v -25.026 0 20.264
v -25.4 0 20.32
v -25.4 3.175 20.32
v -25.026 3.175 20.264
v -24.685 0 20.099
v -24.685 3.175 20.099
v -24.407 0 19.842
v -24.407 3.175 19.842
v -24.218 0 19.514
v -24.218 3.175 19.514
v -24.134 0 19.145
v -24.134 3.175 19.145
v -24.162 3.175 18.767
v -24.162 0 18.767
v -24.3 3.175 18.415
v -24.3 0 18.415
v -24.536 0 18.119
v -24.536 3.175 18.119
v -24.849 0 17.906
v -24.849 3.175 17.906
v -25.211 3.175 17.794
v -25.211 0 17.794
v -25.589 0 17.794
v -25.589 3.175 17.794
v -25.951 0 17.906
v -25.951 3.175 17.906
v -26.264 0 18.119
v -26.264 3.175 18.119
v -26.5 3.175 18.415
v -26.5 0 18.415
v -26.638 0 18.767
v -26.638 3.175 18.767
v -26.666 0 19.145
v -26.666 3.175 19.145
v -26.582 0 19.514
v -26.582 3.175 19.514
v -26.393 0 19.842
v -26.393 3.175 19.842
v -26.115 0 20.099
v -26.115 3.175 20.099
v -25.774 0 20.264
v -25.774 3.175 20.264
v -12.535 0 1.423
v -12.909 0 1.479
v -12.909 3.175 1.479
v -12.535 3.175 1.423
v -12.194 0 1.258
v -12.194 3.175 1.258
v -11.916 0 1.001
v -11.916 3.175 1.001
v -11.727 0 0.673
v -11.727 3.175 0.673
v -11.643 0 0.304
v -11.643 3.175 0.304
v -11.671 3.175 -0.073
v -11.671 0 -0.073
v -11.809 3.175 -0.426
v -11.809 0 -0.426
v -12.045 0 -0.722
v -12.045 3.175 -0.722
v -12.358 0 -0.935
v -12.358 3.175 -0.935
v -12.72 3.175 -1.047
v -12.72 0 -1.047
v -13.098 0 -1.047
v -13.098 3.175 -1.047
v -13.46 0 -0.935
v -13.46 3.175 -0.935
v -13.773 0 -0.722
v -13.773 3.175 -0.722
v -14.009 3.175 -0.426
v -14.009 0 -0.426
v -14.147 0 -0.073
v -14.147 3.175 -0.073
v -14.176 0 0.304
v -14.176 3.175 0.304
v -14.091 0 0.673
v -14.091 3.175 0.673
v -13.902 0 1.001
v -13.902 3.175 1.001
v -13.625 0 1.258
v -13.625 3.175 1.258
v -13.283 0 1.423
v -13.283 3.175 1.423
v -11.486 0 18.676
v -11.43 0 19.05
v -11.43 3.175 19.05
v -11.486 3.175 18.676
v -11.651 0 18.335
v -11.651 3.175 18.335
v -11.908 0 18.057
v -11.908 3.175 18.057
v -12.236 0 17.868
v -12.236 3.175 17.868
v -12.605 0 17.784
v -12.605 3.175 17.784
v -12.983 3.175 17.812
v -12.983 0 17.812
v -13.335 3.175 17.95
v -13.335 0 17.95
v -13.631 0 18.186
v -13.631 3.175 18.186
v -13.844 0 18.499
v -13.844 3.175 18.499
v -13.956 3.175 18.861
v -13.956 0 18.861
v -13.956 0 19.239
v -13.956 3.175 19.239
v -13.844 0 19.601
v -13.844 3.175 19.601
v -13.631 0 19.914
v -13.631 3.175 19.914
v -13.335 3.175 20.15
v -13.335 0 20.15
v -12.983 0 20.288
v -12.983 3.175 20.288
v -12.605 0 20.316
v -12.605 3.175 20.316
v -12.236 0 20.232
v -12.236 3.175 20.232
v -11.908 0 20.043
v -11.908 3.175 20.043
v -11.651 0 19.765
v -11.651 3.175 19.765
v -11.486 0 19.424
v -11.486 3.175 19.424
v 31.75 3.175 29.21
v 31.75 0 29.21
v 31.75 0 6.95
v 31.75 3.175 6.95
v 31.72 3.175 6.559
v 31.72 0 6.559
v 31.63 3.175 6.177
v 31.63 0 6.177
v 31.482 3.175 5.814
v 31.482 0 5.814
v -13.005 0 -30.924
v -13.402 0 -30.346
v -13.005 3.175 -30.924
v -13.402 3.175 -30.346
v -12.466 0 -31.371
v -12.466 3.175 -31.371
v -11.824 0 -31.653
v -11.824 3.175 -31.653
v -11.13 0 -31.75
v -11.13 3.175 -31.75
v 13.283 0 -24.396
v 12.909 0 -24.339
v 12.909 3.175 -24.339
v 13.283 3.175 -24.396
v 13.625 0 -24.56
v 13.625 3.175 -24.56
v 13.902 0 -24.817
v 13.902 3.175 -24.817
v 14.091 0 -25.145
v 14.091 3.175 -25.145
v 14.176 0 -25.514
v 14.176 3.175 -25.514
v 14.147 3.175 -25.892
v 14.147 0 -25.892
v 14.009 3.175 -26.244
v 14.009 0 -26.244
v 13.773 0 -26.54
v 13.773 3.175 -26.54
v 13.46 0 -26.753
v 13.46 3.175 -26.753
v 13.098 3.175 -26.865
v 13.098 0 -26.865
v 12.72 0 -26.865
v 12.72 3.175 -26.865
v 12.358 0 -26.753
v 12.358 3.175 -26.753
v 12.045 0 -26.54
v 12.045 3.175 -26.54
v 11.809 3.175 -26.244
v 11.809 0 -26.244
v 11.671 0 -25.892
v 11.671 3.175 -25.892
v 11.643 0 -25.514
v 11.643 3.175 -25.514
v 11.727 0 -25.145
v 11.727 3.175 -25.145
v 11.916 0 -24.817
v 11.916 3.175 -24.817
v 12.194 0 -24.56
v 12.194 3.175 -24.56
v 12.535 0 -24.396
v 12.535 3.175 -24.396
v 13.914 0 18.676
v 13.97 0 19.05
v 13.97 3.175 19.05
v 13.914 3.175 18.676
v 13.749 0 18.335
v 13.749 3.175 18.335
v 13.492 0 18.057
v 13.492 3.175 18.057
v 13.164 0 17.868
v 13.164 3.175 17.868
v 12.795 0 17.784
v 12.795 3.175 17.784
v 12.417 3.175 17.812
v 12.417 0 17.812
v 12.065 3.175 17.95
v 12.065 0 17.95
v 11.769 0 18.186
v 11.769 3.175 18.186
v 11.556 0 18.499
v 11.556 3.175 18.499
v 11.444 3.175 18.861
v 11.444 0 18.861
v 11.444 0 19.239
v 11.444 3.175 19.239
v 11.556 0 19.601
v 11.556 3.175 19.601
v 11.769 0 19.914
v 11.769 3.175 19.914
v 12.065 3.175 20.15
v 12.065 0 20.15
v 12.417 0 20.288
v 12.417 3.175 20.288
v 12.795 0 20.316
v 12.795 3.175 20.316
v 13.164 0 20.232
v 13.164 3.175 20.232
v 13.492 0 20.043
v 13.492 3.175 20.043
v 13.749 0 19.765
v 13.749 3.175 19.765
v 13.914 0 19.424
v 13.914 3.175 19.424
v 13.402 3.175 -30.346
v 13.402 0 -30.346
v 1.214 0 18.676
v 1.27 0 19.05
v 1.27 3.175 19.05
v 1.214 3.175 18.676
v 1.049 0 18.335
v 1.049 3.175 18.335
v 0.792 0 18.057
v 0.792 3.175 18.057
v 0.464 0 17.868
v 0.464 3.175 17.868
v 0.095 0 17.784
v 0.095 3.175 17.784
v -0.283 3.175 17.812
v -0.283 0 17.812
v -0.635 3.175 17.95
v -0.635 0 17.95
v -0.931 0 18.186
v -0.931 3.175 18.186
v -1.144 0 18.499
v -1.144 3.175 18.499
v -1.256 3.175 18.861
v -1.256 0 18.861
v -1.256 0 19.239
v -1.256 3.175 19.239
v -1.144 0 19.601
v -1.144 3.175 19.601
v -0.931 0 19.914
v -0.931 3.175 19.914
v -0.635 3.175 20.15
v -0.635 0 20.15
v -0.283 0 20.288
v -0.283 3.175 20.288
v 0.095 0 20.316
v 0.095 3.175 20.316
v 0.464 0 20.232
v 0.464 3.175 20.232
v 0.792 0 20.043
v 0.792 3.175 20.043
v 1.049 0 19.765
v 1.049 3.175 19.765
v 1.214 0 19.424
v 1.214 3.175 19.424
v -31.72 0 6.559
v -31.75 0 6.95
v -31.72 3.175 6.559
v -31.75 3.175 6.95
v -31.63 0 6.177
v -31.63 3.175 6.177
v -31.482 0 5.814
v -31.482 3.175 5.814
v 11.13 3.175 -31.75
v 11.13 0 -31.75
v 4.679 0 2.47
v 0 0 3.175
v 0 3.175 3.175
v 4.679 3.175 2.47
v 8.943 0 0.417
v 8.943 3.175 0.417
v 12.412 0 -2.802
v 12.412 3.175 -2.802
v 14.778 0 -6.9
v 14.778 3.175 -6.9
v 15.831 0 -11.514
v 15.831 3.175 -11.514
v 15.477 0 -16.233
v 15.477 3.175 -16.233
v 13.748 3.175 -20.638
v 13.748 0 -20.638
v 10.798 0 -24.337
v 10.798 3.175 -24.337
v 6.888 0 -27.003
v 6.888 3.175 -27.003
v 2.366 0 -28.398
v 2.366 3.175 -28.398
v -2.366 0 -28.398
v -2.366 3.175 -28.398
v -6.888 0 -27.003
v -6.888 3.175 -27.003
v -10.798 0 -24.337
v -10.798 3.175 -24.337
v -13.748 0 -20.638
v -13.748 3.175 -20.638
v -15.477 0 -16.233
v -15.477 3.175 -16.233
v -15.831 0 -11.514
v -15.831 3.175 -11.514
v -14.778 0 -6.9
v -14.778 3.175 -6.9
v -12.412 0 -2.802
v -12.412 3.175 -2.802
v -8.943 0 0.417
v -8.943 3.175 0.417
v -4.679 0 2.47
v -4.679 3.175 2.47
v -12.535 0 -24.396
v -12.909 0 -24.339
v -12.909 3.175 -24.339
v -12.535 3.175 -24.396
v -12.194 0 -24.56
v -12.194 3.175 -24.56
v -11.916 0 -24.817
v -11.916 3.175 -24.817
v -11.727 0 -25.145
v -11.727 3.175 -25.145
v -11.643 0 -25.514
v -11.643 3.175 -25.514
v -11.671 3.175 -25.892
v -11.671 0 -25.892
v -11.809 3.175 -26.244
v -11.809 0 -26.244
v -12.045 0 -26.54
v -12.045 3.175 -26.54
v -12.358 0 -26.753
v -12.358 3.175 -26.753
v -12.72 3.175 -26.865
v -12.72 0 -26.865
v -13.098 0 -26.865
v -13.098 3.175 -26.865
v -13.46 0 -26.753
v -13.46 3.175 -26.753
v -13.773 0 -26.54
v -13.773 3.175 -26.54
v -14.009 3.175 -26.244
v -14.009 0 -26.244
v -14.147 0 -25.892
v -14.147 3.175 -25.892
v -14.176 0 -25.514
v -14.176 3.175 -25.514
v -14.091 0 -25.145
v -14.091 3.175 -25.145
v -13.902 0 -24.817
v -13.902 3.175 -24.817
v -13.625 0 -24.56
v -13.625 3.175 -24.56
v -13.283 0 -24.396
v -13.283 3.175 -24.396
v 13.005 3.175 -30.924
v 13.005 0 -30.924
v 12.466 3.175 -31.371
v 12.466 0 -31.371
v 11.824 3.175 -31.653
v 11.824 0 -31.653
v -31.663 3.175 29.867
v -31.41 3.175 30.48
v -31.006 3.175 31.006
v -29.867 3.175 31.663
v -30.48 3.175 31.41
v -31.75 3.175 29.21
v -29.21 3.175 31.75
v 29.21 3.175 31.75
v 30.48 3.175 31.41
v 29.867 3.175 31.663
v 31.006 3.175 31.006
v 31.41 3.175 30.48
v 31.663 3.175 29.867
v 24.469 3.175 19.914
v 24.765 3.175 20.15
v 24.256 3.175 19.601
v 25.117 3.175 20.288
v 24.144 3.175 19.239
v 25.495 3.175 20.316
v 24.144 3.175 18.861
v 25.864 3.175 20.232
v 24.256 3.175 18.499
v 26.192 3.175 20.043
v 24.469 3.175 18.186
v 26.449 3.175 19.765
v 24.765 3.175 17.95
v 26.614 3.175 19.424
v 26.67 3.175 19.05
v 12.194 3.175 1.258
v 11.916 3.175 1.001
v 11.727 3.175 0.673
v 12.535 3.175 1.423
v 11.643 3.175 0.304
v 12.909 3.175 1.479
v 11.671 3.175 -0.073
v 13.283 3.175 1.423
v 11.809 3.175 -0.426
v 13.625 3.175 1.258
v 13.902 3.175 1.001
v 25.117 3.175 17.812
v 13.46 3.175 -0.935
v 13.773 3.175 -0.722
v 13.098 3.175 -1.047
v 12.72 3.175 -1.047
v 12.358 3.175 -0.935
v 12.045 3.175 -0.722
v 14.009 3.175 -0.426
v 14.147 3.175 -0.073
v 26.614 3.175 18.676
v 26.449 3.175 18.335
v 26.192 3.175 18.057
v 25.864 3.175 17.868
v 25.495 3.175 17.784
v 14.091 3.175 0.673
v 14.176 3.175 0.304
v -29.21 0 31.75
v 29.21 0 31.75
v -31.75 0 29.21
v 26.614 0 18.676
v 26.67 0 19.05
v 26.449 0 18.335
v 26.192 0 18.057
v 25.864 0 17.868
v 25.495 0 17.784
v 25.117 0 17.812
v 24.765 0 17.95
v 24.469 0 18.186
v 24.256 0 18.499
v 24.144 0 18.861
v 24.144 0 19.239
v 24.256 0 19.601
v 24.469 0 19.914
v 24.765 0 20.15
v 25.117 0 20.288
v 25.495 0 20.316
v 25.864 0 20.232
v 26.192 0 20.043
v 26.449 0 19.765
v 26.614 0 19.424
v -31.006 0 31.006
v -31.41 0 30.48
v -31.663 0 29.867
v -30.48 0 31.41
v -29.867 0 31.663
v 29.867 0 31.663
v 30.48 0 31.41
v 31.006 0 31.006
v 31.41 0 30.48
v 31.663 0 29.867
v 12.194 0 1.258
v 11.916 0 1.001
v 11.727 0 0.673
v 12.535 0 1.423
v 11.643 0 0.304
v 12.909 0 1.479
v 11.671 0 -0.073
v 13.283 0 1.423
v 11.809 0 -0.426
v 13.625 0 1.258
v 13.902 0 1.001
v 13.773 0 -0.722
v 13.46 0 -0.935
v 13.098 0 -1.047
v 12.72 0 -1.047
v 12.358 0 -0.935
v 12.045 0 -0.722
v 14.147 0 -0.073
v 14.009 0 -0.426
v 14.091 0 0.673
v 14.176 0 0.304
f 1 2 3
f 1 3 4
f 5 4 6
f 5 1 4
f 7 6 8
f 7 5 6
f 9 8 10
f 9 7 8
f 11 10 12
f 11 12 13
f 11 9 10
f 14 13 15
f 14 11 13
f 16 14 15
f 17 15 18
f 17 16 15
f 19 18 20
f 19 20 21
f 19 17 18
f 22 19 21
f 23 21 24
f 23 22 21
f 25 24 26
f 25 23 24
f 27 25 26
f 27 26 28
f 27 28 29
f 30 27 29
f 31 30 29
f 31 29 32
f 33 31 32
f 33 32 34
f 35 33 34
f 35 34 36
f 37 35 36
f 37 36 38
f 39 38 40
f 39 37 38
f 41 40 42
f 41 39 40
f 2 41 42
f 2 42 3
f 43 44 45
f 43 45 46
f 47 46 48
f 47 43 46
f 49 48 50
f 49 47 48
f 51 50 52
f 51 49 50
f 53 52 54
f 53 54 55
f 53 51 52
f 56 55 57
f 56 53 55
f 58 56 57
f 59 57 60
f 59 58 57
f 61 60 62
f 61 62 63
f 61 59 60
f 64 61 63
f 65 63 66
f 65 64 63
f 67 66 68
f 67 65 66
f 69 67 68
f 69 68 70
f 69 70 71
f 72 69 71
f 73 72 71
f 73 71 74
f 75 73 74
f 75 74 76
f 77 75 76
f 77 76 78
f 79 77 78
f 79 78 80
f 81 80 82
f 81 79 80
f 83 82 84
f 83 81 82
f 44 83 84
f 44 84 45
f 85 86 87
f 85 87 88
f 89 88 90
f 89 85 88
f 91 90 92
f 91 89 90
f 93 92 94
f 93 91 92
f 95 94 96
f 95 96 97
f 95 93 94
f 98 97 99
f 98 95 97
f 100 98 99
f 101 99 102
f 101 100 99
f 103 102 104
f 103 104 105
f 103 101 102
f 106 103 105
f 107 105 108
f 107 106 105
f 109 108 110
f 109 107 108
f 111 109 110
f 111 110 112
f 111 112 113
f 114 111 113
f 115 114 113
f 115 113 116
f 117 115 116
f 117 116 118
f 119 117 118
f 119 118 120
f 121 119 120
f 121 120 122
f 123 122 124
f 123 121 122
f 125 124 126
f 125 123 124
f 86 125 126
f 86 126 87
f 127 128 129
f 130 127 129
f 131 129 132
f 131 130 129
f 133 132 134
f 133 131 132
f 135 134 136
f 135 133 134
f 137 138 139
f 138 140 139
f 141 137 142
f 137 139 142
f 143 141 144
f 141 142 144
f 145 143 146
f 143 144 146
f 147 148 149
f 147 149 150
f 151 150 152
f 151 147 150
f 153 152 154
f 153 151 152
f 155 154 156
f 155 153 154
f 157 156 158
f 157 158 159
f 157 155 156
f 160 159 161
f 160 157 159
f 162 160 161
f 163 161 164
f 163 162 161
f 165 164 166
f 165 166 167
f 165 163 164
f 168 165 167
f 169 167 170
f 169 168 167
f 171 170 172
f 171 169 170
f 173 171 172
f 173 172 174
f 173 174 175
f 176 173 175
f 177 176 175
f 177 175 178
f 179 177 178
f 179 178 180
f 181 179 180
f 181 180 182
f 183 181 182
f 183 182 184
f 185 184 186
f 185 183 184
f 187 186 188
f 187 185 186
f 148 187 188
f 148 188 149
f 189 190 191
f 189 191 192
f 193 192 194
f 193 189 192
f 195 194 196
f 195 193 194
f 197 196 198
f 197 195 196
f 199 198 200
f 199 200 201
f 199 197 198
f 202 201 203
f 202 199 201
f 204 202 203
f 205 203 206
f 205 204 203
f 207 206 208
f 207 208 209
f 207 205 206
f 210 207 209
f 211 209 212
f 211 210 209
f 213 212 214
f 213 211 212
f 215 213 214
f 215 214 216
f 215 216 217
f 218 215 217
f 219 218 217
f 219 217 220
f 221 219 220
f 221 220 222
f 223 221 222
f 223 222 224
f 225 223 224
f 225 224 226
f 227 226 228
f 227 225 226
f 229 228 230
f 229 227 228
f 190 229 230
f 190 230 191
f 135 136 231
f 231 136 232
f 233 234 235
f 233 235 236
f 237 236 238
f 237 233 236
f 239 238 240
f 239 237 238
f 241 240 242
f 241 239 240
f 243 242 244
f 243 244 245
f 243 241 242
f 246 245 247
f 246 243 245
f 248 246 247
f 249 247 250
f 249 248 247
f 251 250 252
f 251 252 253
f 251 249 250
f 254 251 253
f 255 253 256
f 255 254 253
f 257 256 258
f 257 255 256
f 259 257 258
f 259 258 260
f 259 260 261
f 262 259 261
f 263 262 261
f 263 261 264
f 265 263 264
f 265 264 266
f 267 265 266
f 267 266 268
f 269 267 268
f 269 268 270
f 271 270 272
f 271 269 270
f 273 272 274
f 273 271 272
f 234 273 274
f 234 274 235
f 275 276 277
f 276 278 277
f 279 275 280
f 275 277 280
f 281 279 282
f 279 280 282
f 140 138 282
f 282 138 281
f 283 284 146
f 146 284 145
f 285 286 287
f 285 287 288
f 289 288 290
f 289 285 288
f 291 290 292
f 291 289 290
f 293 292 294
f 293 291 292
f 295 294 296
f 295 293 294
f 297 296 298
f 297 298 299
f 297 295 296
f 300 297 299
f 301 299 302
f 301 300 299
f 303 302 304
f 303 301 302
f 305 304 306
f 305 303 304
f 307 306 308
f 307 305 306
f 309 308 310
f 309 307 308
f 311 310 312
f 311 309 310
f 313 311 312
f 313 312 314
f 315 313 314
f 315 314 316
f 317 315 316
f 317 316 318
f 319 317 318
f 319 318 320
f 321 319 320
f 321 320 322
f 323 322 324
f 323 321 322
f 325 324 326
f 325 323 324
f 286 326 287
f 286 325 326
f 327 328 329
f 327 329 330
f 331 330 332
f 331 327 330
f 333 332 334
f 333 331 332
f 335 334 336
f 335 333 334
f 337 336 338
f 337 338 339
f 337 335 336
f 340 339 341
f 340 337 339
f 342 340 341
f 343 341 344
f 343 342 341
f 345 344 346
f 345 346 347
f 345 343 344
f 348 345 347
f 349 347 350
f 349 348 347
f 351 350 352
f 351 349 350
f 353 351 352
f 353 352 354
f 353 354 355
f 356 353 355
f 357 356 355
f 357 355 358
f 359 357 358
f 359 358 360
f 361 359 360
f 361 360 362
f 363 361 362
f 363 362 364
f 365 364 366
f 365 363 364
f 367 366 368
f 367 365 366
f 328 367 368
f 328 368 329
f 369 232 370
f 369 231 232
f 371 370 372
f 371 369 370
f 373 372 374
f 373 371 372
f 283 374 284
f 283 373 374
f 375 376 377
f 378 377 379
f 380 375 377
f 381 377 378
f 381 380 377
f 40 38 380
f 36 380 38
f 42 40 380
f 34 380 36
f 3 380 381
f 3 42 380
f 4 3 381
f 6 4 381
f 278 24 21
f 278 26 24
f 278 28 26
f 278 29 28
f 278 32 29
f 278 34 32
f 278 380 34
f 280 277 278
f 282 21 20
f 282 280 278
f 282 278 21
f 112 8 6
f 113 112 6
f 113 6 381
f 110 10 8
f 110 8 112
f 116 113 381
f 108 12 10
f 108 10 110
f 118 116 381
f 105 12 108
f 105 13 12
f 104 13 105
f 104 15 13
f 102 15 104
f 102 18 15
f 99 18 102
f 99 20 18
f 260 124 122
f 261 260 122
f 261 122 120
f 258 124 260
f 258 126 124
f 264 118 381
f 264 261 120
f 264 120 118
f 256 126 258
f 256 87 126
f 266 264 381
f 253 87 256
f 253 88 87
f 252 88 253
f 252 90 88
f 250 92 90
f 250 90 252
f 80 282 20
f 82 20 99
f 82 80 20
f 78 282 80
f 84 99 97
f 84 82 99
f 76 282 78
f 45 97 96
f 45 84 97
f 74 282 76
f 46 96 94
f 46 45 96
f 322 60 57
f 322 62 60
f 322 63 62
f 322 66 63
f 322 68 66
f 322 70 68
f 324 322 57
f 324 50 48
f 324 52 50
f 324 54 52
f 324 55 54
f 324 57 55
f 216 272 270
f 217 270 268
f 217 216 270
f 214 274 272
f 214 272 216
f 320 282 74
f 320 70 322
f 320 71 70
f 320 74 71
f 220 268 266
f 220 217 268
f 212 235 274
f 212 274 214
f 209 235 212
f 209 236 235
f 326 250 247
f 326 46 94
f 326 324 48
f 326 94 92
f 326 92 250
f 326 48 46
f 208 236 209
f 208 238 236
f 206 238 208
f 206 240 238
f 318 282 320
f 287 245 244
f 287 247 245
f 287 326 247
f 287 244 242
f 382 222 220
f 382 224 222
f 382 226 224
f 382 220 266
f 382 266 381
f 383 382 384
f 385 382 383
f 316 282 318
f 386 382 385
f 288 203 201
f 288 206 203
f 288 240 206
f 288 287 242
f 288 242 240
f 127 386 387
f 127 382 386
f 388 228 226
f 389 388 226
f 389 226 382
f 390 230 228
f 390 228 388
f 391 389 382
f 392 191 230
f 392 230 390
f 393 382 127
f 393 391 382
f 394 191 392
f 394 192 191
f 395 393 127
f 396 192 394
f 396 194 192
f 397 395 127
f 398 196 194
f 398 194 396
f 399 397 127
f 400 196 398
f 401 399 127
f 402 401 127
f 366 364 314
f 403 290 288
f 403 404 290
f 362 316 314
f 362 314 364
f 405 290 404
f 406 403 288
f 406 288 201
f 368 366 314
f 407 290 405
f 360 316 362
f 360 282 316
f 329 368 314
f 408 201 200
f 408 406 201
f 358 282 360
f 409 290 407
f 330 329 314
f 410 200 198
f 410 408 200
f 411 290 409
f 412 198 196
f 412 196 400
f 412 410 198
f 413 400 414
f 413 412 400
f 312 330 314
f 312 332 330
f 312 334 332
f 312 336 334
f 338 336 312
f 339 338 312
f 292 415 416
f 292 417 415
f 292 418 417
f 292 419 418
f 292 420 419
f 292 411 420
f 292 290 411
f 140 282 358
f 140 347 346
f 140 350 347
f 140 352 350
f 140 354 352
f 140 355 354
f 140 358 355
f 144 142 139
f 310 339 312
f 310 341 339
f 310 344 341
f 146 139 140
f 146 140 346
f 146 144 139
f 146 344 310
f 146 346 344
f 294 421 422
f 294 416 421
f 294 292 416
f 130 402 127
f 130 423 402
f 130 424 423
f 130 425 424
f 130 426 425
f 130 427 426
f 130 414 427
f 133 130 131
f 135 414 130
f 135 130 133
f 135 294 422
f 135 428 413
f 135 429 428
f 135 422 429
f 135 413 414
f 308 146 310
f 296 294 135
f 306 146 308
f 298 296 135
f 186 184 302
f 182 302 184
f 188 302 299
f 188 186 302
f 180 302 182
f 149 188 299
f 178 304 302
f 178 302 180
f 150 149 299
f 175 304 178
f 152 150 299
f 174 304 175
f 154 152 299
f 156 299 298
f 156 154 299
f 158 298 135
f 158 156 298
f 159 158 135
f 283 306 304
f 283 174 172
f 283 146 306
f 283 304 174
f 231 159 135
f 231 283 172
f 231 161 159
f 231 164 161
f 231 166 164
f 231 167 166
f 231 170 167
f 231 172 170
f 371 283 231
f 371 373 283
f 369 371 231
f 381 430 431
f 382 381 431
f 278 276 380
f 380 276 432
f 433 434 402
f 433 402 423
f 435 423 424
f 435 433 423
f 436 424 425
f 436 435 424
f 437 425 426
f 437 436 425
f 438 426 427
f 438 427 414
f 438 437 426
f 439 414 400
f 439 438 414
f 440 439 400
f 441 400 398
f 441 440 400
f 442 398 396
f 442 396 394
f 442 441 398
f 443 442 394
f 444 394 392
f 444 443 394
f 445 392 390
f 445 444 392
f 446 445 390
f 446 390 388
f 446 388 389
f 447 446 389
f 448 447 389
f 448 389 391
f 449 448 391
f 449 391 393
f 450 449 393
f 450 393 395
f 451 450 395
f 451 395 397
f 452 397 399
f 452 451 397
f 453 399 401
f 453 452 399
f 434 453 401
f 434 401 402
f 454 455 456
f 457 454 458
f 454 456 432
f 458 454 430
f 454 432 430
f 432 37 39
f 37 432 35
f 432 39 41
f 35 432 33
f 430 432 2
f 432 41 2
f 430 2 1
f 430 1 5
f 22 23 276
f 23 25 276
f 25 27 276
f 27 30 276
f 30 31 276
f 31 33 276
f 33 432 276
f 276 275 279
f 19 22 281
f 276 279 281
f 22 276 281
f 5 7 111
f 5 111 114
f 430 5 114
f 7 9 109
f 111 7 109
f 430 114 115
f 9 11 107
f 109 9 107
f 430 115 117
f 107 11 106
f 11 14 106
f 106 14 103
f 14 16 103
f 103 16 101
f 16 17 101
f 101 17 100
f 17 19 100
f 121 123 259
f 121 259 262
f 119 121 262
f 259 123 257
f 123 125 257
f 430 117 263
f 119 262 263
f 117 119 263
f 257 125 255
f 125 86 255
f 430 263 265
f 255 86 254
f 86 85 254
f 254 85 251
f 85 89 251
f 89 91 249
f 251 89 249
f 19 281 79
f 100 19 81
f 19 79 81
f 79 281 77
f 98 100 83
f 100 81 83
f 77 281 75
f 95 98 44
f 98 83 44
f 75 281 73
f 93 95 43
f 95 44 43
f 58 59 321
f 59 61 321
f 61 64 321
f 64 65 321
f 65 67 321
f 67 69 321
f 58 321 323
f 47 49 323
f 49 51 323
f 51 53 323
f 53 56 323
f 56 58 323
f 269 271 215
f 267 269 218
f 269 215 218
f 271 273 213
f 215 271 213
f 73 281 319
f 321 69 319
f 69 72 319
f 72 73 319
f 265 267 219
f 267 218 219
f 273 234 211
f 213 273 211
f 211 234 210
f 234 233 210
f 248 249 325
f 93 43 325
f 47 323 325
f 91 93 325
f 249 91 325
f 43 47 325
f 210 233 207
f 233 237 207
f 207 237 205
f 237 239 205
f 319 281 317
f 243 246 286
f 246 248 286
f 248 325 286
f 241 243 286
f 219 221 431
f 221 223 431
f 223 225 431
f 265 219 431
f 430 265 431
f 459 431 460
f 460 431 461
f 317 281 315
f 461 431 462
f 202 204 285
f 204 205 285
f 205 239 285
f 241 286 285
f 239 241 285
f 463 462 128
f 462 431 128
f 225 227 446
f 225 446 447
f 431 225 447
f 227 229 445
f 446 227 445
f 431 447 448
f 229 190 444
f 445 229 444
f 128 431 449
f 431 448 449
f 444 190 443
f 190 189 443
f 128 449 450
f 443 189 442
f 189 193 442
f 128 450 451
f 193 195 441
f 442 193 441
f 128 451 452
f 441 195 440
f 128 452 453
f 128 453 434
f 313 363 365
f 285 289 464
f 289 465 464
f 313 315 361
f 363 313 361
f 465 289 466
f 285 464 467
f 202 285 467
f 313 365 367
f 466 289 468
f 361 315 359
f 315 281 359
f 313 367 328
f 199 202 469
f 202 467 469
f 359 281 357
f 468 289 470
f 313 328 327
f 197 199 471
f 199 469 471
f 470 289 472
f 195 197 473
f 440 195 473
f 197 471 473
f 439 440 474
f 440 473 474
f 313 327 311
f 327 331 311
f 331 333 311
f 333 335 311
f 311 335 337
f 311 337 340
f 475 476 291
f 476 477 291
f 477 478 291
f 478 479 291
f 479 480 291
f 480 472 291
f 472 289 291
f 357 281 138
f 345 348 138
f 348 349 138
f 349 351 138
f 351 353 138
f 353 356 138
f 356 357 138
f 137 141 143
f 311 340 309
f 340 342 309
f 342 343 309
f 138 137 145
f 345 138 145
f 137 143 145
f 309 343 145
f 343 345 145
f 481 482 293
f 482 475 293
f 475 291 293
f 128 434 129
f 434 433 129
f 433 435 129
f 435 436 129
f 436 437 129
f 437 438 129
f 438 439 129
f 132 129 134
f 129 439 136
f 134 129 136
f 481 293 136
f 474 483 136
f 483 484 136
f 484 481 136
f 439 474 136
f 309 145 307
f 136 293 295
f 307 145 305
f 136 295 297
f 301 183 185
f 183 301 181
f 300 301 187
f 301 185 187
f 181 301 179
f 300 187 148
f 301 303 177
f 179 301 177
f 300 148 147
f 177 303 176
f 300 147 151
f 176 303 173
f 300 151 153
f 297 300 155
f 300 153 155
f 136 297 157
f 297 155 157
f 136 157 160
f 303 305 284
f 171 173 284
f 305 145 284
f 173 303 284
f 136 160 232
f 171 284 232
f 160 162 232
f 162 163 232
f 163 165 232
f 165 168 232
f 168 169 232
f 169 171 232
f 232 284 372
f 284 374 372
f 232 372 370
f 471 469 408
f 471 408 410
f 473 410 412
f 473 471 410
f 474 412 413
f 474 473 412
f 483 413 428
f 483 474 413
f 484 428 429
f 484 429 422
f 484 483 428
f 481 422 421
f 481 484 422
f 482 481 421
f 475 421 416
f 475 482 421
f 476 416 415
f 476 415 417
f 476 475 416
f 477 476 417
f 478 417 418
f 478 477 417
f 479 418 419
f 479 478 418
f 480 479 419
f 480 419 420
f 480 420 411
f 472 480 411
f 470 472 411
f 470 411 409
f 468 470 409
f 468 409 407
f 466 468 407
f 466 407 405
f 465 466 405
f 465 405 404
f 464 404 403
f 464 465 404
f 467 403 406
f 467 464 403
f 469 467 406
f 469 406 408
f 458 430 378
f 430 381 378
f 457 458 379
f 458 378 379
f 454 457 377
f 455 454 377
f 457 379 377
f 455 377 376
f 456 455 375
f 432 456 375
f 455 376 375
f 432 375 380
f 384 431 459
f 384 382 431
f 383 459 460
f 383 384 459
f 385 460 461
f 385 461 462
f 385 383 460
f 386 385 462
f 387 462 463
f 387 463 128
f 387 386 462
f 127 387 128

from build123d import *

# Parameters (mm, degrees)
SKETCH1_R             = 15.875
SKETCH1_R_2           = 1.27
INITIAL_BRACKET_DEPTH = 3.175
EDGE_FILLET_R         = 2.54
LPATTERN1_OUTLINE_R   = 1.27
LPATTERN1_DEPTH       = 3.175


# Read off the part's stored shape, not the designer's step: LPattern1
with BuildPart() as part:
    # Sketch1 → Initial Bracket (new body)
    with BuildSketch(Plane(origin=(0, 0, 0), x_dir=(1, 0, 0), z_dir=(0, 1, 0))):
        Polygon((-31.75, -31.75), (31.75, -31.75), (31.75, -6.35), (12.7, 31.75), (-12.7, 31.75), (-31.75, -6.35), align=None)
        with Locations(Location((0, 12.7, 0), (0, 0, 270))):
            Circle(SKETCH1_R, mode=Mode.SUBTRACT)
        with Locations(Location((12.909118174, 25.609118174, 0), (0, 0, 270))):
            Circle(SKETCH1_R_2, mode=Mode.SUBTRACT)
        with Locations(Location((12.909118174, -0.209118174, 0), (0, 0, 270))):
            Circle(SKETCH1_R_2, mode=Mode.SUBTRACT)
        with Locations(Location((-12.909118174, -0.209118174, 0), (0, 0, 270))):
            Circle(SKETCH1_R_2, mode=Mode.SUBTRACT)
        with Locations(Location((-12.909118174, 25.609118174, 0), (0, 0, 270))):
            Circle(SKETCH1_R_2, mode=Mode.SUBTRACT)
        with Locations(Location((-25.4, -19.05, 0), (0, 0, 270))):
            Circle(SKETCH1_R_2, mode=Mode.SUBTRACT)
    extrude(amount=INITIAL_BRACKET_DEPTH)

    # Edge Fillet
    edge_fillet_edges = [part.edges().sort_by_distance(p)[0] for p in [
        (31.75, 1.5875, 31.75),
        (-31.75, 1.5875, 31.75),
        (-31.75, 1.5875, 6.35),
        (-12.7, 1.5875, -31.75),
        (12.7, 1.5875, -31.75),
        (31.75, 1.5875, 6.35),
    ]]
    fillet(edge_fillet_edges, radius=EDGE_FILLET_R)

    # LPattern1 outline → LPattern1 (cut)
    with BuildSketch(Plane(origin=(0, 0, 0), x_dir=(1, 0, 0), z_dir=(0, 1, 0))):
        with Locations((25.4, -19.05)):
            Circle(LPATTERN1_OUTLINE_R)
        with Locations((12.7, -19.05)):
            Circle(LPATTERN1_OUTLINE_R)
        with Locations((0, -19.05)):
            Circle(LPATTERN1_OUTLINE_R)
        with Locations((-12.7, -19.05)):
            Circle(LPATTERN1_OUTLINE_R)
    extrude(amount=LPATTERN1_DEPTH, mode=Mode.SUBTRACT)


solid = part.part
